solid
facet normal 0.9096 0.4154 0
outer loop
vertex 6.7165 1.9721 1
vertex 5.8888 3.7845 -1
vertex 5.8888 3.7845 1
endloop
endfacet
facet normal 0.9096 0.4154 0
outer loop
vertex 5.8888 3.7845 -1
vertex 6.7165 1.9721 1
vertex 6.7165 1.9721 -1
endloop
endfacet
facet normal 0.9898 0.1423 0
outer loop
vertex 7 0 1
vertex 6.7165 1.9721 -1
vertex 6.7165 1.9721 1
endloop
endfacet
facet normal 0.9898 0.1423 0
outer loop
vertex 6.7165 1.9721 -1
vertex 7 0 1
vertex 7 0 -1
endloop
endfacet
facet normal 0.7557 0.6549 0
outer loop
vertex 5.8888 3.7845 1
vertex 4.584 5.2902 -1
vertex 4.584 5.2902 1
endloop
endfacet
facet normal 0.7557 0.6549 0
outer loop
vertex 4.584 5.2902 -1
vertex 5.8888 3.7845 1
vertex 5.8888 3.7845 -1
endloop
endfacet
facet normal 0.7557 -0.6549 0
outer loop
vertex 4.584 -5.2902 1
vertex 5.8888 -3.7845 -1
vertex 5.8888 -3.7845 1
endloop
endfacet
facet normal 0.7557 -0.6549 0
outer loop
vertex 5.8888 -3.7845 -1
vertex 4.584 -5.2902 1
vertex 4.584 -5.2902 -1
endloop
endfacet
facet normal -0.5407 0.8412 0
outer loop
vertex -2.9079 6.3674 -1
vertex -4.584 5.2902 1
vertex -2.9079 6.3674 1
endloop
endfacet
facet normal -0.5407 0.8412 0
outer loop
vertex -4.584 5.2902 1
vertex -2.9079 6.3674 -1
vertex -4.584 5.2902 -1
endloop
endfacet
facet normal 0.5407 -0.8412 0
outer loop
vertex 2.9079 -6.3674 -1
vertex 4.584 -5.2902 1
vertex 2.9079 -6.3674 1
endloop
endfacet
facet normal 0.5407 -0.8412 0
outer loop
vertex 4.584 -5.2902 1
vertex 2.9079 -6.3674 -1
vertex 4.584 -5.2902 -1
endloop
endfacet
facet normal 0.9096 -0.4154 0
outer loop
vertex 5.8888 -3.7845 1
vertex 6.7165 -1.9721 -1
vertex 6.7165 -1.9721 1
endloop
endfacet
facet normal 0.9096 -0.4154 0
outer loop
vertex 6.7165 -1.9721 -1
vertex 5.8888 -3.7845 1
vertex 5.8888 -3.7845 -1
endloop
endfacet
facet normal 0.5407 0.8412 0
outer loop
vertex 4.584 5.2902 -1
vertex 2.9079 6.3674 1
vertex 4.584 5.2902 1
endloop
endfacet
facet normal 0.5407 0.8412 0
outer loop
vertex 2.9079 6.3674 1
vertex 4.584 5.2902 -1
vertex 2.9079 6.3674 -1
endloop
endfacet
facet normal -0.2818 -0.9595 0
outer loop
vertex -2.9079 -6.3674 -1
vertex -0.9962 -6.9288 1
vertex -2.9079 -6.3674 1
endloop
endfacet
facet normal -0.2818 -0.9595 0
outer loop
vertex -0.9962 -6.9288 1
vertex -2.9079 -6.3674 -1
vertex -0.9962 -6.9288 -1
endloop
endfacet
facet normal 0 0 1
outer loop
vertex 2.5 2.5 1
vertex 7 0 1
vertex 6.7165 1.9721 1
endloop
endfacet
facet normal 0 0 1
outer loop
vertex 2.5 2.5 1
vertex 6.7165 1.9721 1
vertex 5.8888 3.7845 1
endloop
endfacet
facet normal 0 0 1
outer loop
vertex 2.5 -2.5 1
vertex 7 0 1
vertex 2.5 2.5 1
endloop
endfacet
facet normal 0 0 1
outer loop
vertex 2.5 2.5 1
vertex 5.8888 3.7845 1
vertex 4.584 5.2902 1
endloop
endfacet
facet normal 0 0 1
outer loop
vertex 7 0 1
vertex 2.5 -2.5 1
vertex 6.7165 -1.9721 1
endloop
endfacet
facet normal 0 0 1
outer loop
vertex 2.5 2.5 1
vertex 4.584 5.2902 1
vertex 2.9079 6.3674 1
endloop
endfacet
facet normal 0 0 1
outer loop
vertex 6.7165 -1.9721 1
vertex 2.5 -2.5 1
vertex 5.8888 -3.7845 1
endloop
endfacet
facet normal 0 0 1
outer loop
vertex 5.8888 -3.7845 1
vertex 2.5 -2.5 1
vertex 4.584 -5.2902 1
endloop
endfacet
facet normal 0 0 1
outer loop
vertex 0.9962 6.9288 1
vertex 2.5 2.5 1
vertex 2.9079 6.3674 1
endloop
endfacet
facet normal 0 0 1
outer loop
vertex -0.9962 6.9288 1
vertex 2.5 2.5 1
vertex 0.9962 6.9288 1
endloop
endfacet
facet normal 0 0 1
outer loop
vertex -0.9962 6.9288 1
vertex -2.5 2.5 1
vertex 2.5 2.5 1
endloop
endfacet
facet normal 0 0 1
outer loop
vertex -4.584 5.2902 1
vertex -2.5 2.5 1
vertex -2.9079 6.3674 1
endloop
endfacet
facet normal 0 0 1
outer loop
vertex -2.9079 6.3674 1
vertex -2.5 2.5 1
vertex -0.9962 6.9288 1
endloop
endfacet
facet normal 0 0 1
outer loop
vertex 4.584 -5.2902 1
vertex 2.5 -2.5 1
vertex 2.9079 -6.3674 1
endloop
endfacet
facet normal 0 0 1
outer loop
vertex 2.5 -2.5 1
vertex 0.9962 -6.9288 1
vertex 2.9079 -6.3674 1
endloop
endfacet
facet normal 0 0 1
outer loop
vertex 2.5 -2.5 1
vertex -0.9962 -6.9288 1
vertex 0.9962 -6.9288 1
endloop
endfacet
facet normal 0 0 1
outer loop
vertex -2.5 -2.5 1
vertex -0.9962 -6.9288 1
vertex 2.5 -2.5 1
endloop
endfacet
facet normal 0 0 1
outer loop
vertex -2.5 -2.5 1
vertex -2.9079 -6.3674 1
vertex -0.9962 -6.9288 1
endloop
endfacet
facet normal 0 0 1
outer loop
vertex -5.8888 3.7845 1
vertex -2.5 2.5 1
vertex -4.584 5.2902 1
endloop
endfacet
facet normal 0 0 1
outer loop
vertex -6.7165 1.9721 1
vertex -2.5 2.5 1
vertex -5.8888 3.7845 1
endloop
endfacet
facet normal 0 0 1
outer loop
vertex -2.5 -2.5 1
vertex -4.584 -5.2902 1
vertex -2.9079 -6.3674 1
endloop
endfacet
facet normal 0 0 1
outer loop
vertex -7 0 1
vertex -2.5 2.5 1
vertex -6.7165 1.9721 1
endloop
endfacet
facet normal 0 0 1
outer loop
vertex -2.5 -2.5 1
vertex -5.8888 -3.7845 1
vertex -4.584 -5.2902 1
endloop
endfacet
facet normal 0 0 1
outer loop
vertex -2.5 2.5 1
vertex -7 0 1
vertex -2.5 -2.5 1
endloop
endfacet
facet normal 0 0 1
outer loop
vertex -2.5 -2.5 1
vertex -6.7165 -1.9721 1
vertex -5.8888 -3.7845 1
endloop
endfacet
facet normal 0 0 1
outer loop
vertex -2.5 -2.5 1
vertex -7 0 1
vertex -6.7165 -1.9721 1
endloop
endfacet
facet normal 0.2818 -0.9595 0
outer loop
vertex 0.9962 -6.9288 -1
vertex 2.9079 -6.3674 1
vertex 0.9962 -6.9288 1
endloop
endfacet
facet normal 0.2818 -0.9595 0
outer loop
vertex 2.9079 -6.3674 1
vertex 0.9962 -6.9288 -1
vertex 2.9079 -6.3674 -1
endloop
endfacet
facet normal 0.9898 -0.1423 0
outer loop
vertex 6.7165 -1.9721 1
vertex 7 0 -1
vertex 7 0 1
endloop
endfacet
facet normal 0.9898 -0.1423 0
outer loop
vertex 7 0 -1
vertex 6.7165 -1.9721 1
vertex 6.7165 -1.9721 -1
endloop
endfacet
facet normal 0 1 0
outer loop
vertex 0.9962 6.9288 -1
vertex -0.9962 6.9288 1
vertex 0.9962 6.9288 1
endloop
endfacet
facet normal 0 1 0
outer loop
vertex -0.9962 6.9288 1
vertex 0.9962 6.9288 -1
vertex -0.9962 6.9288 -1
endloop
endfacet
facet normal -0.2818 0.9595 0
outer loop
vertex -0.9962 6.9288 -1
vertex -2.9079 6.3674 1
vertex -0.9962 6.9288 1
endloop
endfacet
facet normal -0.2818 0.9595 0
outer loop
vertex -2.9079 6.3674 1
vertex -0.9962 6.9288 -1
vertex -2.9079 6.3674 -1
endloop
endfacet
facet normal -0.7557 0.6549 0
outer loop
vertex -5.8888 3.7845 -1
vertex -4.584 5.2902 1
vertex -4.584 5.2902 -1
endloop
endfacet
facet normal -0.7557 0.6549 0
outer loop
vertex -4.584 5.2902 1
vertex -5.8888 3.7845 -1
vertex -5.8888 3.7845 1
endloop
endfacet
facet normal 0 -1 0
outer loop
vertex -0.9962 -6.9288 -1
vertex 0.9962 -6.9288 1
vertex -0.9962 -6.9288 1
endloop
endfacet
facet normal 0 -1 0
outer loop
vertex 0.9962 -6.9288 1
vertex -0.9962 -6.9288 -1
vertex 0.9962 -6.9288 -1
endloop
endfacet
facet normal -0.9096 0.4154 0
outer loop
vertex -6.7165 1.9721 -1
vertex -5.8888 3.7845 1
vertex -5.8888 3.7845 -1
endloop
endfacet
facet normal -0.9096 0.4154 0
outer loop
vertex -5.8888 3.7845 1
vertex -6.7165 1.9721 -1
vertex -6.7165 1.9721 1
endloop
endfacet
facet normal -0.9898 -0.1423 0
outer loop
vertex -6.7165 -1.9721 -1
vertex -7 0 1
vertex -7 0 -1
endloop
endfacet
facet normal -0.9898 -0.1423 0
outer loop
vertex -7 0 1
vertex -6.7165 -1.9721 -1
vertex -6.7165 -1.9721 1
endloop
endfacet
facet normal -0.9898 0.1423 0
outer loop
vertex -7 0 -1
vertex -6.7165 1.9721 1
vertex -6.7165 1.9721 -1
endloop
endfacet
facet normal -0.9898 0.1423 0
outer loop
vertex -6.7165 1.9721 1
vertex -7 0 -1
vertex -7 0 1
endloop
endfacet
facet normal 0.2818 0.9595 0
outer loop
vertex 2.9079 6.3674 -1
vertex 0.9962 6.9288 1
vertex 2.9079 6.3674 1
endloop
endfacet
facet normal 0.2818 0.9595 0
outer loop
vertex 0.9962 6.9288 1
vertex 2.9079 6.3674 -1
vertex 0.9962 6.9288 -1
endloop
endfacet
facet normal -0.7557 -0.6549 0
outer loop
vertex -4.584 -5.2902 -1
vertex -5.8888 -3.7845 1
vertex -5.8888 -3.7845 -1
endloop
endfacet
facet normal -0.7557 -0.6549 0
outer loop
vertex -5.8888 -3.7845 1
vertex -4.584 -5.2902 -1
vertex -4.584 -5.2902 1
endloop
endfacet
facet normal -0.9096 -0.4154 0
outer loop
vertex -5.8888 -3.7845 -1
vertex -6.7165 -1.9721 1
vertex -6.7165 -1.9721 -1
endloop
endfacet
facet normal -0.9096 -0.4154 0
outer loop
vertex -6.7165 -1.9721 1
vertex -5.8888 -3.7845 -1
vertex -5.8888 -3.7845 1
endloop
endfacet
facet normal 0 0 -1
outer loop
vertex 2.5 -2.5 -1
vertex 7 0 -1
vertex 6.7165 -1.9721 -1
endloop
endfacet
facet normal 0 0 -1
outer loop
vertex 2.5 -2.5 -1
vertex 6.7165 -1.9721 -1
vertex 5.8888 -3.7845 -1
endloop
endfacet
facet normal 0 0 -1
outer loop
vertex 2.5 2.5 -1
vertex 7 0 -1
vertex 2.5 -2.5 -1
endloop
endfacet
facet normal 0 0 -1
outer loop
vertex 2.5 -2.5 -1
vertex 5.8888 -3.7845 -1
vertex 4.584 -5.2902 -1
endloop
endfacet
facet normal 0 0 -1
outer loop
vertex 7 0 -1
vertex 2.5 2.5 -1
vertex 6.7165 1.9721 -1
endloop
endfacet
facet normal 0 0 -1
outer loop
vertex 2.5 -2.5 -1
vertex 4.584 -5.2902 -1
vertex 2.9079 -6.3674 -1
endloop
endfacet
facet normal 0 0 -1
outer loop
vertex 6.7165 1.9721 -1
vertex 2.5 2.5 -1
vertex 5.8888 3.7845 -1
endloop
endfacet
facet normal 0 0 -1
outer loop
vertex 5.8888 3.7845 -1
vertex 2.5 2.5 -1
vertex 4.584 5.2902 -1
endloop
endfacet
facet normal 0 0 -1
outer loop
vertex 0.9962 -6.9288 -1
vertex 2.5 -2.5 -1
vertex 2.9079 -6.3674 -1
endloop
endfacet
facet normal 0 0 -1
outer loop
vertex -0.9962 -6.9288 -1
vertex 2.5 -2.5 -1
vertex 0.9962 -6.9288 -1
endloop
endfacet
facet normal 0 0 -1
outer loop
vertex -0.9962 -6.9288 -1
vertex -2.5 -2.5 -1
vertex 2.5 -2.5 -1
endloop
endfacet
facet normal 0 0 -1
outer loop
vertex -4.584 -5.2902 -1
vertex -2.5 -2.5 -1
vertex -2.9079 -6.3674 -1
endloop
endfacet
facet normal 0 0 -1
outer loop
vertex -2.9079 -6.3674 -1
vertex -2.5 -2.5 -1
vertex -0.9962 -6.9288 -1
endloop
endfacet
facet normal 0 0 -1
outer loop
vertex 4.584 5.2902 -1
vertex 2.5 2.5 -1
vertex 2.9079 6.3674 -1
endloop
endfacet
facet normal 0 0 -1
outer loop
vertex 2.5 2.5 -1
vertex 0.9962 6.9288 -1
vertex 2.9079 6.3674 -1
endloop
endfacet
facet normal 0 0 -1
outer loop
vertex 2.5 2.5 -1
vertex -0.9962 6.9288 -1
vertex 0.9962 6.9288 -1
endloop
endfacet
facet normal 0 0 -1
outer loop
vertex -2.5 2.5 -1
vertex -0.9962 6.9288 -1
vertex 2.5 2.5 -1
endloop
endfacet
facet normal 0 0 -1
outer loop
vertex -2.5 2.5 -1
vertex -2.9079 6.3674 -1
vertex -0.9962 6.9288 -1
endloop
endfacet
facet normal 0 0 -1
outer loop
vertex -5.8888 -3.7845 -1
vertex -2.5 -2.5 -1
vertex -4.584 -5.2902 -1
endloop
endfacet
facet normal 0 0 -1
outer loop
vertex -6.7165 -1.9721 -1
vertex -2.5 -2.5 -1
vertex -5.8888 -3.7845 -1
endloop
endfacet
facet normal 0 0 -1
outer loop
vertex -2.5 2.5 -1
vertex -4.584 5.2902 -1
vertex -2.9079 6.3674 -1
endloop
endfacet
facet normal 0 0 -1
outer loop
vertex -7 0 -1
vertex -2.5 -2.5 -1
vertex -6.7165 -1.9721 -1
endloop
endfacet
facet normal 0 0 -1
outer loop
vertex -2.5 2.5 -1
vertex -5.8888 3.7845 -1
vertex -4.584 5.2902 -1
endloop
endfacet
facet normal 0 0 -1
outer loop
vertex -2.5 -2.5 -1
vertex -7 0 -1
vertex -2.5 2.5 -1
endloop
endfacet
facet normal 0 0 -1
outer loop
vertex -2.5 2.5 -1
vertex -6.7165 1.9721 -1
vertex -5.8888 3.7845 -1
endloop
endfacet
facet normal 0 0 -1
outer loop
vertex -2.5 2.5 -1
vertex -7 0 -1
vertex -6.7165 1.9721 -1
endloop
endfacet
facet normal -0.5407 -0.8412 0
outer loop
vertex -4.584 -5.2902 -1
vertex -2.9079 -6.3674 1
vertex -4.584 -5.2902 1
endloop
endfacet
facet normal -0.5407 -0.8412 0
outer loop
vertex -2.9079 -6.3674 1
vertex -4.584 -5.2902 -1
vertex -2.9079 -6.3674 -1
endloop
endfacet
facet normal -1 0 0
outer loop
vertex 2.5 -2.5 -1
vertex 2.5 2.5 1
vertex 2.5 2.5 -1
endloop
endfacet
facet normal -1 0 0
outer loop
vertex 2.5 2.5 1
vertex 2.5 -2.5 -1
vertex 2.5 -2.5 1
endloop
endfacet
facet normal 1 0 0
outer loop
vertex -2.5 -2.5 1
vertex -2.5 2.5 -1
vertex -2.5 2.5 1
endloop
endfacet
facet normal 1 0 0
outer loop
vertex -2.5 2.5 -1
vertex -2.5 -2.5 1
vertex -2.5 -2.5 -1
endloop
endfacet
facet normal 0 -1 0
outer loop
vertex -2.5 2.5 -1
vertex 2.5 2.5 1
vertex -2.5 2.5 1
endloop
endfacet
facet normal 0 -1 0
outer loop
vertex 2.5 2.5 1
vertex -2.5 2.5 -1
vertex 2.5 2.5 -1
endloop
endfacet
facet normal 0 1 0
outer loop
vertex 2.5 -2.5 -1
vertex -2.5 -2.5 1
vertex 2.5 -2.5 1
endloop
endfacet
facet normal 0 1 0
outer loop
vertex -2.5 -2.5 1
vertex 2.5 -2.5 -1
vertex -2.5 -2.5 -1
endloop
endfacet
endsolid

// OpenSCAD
// file: ../../../../../../../../../../../openscad/models/src/main/openscad/shapes/open-cylinder/open-cylinder.scad
module openCylinder(height = 3,
                    outerRadius = 7,
                    innerRadius = 4.5,
                    fn = 100)
{
    $fn = fn;

    difference()
    {
        cylinder(r=outerRadius,
                 h=height);

        translate([0, 0, -1])
        cylinder(r=innerRadius,
                 h=height+1.01);
    }
}
// file: ../../../../../../../../../../../openscad/models/src/main/openscad/shapes/heart/heart.scad
module heart(height=1)
{
    rotate ([0, 0, 45])
    linear_extrude(height=height)
    flatHeart();
}

module heartThumbnail(height=1)
{	
    xyScale = 0.725;
    translate([0, -1.5, 0])
    scale([xyScale, xyScale, 1])
    heart(height);
}

module flatHeart()
{
    square(20, center = true);

    translate([10,0,0])	
    circle(10, center = true, color="red" );

    translate([0,10,0]) 
    circle(10, center = true);
}
// file: ../../../../../../../../../../../openscad/models/src/main/openscad/external-resources/batman/batman.scad
module batmanLogo(height=1)
{
//    color([0.15,0.15,0.15])
    color("blue")
    linear_extrude(height = height, center = true, convexity = 10, twist = 0)
    difference()
    {
        
        translate([0,20,0])
        polygon(points=[[-9.8, -14], [9.8,-14],[3.8, 14],[-3.8, 14] ],paths=[[0,1,2,3]], convexity=10);
    
        translate([0,30,0])
        polygon(points=[[-2, -8], [2,-8],[12, 8],[-12, 8] ],paths=[[0,1,2,3]], convexity=10);
    }
    
//    color([0.15,0.15,0.15])
    color("blue")
    linear_extrude(height = height, center = true, convexity = 10, twist = 0)
    difference()
    {
        projection(cut=true) 
        rotate([0,50,0])
        cylinder(r=30, h=200, center=true);
    
        translate([-8,-23,0]) 
        rotate([0,0,-60])
        projection(cut=true)
        rotate([0,62,0])
        cylinder(r=7, h=200, center=true);
    
        translate([8,-23,0]) 
        rotate([0,0,60])
        projection(cut=true)
        rotate([0,62,0])
        cylinder(r=7, h=200, center=true);
    
        translate([-18,-24,0]) 
        rotate([0,0,-50])
        projection(cut=true)
        rotate([0,67,0])
        cylinder(r=7, h=200, center=true);
    
        translate([18,-24,0]) 
        rotate([0,0,50])
        projection(cut=true)
        rotate([0,67,0])
        cylinder(r=7, h=200, center=true);
    
        union()
        {
    
            translate([-7,25,0]) 
            rotate([0,0,30])
            projection(cut=true)
            rotate([0,45,0])
            cylinder(r=13, h=200, center=true);
    
            translate([7,25,0]) 
            rotate([0,0,-30])
            projection(cut=true)
            rotate([0,45,0])
            cylinder(r=13, h=200, center=true);
        }
    }
}

//TODO: make this a proper thumbnail using thumbnail-background.scad
module batmanLogoThumbnail()
{
    xyScale = 0.27;
    translate([0.4, -0.3, 0])
    scale([xyScale, xyScale, 2.78])	
    batmanLogo();
}
// file: ../light-signal-test.scad
use <../../../../../../../../../../openscad/models/src/main/openscad/external-resources/batman/batman.scad>

use <../../../../../../../../../../openscad/models/src/main/openscad/shapes/heart/heart.scad>

use <../../../../../../../../../../openscad/models/src/main/openscad/shapes/open-cylinder/open-cylinder.scad>
// main file
use <../light-signal-test.scad>

color([1,0.7843,0])difference(){cylinder(h=2, r=7, center=true);
cube([5,5,5],center=true);
}
